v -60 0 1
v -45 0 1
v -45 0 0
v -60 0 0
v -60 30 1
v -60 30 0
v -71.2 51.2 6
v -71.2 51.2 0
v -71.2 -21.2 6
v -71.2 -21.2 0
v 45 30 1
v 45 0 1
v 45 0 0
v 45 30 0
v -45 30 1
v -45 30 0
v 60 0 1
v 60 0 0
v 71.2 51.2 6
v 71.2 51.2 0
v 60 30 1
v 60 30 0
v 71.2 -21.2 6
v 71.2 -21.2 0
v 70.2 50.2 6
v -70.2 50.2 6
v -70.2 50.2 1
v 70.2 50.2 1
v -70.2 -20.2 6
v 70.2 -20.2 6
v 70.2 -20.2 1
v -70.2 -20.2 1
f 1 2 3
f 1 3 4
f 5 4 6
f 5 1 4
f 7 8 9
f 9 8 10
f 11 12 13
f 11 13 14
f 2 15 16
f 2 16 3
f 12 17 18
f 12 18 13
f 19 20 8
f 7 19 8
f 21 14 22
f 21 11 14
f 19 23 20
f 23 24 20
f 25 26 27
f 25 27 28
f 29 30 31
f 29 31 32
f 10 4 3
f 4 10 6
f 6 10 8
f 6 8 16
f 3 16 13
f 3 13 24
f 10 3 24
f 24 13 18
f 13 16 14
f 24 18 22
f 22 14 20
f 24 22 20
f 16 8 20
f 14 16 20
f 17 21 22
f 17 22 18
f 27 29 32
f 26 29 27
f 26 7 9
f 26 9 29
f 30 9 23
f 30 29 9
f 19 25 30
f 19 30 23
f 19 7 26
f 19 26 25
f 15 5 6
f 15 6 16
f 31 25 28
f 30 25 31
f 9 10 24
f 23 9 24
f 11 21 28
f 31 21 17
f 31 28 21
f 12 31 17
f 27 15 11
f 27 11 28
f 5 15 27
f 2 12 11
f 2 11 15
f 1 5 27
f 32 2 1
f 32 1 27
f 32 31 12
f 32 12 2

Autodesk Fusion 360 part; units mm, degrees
sketch "Esquisse1" plane through (0, 0, 0) normal (0, 0, 1) x (1, 0, 0)
  line L0 (71.2, 51.2) -> (-71.2, 51.2)
  line L1 (-71.2, 51.2) -> (-71.2, -21.2)
  line L2 (-71.2, -21.2) -> (71.2, -21.2)
  line L3 (71.2, -21.2) -> (71.2, 51.2)
extrude "Extrusion1" add sketch "Esquisse1" along normal blind 5
extrude "Extrusion2" add 1 faces at (-23.7333, 27.0667, 5) along direction (0, 0, 1) blind 1
sketch "Esquisse2" plane through (0, 0, 6) normal (0, 0, 1) x (-1, 0, 0)
  line L0 (-71.2, 21.2) -> (-71.2, -51.2)
  line L1 (-71.2, -51.2) -> (71.2, -51.2)
  line L2 (71.2, -51.2) -> (71.2, 21.2)
  line L3 (71.2, 21.2) -> (-71.2, 21.2)
  line L4 (70.2, -50.2) -> (-70.2, -50.2)
  line L5 (-70.2, -50.2) -> (-70.2, 20.2)
  line L6 (-70.2, 20.2) -> (70.2, 20.2)
  line L7 (70.2, 20.2) -> (70.2, -50.2)
extrude "Extrusion3" cut sketch "Esquisse2" against normal blind 5 contours L4 L5 L6 L7
sketch "Esquisse3" plane through (0, 0, 1) normal (0, 0, 1) x (-1, 0, 0)
  line L0 (70.2, 20.2) -> (-70.2, 20.2)
  line L1 (-70.2, 20.2) -> (-70.2, -50.2)
  line L2 (-70.2, -50.2) -> (70.2, -50.2)
  line L3 (70.2, -50.2) -> (70.2, 20.2)
  line L4 (45, 0) -> (60, 0)
  line L5 (60, 0) -> (60, -30)
  line L6 (60, -30) -> (45, -30)
  line L7 (45, -30) -> (45, 0)
  line L8 (-60, 0) -> (-45, 0)
  line L9 (-45, 0) -> (-45, -30)
  line L10 (-45, -30) -> (-60, -30)
  line L11 (-60, -30) -> (-60, 0)
extrude "Extrusion4" cut sketch "Esquisse3" against normal blind 1 contours L4 L5 L6 L7 | L8 L9 L10 L11
